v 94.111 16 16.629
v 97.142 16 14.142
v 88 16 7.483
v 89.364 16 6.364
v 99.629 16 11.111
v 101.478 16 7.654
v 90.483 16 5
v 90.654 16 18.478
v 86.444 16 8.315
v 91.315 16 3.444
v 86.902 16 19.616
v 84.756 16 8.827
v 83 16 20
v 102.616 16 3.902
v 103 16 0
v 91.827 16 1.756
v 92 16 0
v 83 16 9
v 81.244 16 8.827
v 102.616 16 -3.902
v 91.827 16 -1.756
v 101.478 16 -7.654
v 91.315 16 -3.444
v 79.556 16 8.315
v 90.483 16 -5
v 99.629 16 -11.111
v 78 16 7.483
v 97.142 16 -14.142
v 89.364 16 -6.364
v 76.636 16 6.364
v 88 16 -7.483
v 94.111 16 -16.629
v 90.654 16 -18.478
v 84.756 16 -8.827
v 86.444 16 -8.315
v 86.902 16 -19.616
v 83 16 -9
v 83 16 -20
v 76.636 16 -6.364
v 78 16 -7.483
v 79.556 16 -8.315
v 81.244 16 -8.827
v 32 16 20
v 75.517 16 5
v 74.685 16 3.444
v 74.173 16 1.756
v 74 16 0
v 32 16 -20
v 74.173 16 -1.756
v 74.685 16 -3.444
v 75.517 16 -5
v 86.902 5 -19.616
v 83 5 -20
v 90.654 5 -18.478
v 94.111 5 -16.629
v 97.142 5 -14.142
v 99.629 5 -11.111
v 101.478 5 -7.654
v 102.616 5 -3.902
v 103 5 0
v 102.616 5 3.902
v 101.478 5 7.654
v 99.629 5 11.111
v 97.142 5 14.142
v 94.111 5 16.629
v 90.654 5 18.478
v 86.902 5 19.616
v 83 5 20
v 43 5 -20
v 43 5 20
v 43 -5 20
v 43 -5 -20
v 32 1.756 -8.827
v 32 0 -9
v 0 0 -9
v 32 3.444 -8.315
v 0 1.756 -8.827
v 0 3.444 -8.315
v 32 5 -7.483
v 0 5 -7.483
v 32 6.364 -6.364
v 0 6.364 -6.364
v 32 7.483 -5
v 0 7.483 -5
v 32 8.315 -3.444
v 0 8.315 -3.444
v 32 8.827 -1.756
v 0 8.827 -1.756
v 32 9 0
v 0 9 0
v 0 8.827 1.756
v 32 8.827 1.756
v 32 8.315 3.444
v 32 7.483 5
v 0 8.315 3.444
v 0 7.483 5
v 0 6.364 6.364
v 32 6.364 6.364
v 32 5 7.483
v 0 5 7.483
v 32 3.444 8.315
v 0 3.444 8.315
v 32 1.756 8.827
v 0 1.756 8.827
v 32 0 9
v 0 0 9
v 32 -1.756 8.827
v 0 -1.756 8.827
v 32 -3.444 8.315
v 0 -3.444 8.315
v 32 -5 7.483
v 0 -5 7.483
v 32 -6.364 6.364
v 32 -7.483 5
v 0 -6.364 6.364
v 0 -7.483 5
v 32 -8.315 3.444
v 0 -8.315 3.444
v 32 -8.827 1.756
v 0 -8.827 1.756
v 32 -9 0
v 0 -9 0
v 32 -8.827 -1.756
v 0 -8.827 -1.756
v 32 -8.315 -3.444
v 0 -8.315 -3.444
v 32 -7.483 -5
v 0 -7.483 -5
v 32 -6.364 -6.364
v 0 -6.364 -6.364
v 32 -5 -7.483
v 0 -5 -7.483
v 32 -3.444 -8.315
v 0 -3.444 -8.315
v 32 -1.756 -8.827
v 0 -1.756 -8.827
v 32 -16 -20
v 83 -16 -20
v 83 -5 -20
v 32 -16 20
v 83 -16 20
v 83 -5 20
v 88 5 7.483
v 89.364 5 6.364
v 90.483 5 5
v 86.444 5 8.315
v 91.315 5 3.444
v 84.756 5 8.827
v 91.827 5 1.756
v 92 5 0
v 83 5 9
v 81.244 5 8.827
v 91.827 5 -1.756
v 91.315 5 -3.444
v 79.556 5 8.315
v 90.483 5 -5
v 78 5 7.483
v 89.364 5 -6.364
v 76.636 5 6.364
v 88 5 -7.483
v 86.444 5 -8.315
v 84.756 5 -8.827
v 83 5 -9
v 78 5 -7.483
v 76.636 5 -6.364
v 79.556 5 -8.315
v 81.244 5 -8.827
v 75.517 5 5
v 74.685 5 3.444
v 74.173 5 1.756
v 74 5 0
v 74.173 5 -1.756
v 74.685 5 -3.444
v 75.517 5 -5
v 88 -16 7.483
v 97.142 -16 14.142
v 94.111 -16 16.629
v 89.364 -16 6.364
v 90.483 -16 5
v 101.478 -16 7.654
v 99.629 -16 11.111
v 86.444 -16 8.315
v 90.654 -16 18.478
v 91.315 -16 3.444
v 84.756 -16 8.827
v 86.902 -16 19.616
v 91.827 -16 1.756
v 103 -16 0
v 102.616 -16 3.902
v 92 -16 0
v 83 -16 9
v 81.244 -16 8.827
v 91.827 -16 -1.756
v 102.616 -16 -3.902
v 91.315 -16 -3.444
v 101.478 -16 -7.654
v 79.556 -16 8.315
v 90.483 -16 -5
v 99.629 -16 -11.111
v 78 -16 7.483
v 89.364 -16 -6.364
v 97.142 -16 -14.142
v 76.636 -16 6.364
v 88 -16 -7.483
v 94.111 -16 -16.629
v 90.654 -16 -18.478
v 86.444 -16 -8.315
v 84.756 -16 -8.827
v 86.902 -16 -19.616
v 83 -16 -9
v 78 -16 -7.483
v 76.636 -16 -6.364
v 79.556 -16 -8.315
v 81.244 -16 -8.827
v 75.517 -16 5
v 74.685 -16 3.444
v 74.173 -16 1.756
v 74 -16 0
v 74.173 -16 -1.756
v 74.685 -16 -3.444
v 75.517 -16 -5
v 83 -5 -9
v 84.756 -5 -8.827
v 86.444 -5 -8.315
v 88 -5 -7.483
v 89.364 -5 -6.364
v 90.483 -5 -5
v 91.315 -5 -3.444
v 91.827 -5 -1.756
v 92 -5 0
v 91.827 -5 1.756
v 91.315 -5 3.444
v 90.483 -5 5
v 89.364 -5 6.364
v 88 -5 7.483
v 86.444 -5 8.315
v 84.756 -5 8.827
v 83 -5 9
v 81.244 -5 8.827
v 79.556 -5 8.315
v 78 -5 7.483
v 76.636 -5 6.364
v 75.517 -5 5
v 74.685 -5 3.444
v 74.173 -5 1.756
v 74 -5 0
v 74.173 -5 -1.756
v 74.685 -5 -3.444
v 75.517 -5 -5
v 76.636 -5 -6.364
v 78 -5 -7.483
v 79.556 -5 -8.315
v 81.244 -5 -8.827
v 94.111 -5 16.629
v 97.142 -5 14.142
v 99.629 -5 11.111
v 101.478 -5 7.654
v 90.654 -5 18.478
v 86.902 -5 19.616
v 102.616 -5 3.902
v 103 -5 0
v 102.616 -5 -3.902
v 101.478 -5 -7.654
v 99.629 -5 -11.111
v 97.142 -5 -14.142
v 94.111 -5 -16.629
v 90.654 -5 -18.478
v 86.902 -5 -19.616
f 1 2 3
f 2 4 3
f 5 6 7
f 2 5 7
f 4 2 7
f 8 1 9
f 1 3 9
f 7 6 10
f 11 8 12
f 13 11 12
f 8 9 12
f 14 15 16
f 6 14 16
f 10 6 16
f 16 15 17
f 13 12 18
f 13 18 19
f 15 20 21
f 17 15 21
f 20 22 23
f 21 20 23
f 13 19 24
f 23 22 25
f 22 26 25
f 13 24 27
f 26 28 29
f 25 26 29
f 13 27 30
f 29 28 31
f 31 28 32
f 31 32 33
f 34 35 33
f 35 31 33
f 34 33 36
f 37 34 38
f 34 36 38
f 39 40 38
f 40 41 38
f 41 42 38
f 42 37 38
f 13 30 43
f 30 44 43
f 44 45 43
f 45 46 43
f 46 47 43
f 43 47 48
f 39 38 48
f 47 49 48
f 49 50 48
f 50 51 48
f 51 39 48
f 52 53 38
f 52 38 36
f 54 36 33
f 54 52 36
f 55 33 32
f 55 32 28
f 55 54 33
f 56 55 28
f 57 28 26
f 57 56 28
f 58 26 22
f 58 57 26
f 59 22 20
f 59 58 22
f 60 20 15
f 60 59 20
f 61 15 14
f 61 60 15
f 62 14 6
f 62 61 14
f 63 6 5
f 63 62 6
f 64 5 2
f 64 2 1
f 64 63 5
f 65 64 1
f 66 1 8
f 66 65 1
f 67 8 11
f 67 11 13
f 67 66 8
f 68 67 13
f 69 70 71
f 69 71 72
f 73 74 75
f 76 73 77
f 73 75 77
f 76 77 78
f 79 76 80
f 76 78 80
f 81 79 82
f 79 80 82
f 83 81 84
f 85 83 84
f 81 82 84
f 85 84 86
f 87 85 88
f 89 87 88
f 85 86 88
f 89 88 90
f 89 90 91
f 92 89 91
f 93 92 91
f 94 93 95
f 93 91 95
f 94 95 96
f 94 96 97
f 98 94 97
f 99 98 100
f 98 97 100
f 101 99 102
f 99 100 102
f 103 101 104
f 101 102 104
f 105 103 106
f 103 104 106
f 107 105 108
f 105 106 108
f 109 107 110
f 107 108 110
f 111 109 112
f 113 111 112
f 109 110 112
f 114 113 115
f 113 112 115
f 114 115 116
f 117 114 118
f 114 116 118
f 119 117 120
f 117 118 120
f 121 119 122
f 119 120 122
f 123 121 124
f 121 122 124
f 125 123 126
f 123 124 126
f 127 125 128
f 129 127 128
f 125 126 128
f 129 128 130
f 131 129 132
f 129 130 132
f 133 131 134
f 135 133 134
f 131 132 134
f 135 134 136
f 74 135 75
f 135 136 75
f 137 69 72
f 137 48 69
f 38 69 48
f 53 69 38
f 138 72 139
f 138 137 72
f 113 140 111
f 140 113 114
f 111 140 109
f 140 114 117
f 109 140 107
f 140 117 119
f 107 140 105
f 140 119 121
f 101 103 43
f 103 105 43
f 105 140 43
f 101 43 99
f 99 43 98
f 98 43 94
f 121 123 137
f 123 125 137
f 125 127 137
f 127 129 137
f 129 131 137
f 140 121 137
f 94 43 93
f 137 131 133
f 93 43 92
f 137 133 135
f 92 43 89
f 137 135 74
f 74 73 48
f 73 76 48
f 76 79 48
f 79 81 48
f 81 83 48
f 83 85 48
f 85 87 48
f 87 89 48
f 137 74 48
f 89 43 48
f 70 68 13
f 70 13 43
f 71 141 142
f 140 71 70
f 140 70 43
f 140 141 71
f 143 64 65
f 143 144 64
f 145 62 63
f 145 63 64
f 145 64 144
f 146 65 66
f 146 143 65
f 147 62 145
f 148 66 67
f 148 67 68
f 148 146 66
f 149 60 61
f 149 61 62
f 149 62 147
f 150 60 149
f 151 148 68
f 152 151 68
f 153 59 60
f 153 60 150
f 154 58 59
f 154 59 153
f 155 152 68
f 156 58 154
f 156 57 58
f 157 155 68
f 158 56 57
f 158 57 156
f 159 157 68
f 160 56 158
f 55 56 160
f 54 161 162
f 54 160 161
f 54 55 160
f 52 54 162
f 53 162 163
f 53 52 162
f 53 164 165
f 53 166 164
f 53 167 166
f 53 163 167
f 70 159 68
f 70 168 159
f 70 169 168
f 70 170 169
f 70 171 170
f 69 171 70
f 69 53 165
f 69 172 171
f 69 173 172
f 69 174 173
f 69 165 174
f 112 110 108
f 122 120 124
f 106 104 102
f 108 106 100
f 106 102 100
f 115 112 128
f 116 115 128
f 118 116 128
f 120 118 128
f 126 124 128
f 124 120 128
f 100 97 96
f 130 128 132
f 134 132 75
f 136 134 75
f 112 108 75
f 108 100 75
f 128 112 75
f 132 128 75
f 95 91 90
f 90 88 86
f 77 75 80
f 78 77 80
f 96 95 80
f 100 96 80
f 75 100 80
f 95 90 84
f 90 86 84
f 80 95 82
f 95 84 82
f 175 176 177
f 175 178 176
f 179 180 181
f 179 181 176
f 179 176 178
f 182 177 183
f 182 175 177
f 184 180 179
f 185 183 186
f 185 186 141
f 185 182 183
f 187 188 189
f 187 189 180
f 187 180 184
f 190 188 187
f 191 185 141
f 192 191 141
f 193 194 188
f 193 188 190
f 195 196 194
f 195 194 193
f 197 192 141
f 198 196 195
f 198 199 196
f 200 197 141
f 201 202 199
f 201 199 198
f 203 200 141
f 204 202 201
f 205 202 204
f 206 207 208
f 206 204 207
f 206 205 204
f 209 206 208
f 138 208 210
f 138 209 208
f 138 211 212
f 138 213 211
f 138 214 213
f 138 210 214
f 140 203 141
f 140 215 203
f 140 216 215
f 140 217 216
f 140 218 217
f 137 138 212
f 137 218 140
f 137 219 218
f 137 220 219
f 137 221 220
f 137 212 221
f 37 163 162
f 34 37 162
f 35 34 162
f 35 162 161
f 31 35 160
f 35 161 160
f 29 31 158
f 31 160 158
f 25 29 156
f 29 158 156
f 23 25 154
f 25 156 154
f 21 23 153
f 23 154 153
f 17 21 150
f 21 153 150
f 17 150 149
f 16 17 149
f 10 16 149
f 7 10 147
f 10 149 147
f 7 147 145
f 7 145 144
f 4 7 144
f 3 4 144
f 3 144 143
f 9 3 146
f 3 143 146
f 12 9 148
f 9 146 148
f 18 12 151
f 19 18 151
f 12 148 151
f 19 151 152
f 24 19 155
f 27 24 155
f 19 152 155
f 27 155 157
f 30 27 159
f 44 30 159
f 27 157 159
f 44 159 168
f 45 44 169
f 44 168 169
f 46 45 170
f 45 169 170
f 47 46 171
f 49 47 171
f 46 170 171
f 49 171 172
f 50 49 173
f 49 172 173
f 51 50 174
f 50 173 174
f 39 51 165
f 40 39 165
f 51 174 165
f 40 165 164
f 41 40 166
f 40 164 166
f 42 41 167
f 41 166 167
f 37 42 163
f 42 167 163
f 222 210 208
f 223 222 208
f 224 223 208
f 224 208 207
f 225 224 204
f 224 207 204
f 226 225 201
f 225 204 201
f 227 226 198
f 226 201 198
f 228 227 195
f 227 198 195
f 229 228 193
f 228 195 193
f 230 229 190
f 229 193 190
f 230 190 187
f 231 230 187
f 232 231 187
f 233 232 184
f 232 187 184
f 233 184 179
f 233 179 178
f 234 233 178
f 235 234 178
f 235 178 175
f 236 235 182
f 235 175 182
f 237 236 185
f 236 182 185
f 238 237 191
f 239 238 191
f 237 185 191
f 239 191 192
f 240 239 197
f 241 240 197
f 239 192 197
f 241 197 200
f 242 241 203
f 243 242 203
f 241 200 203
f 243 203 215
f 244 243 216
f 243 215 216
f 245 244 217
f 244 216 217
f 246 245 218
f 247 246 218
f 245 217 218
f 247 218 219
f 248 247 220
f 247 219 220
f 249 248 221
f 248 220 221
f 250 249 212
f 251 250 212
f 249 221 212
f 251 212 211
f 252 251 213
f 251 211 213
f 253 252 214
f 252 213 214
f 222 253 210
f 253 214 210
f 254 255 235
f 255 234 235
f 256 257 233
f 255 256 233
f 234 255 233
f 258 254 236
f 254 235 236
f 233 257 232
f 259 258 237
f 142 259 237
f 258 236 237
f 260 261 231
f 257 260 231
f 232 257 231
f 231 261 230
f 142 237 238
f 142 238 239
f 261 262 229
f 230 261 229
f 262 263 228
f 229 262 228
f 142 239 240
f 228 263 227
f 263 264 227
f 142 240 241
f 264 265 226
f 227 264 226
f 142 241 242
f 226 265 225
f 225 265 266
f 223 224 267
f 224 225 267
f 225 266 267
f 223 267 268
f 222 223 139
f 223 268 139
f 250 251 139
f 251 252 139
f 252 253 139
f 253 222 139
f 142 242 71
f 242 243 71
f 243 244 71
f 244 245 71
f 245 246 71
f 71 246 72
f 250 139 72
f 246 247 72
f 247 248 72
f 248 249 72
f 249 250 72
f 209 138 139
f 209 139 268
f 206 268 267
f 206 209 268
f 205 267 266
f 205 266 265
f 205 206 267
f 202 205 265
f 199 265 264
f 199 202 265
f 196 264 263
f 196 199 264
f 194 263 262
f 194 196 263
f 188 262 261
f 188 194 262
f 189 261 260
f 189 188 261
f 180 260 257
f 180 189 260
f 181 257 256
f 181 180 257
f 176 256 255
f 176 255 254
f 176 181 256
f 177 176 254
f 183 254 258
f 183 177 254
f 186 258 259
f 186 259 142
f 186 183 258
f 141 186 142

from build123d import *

# Parameters (mm, degrees)
SKETCH1_R           = 9
BOSS_EXTRUDE1_DEPTH = 32
SKETCH2_W           = 40
SKETCH2_H           = 32
BOSS_EXTRUDE2_DEPTH = 11
SKETCH3_R           = 9
BOSS_EXTRUDE5_DEPTH = 11
LPATTERN1_COUNT     = 2
LPATTERN1_PITCH     = 21


with BuildPart() as part:
    # Sketch1 → Boss-Extrude1 (new body)
    with BuildSketch(Plane(origin=(0, 0, 0), x_dir=(0, 0, -1), z_dir=(1, 0, 0))):
        Circle(SKETCH1_R)
    extrude(amount=BOSS_EXTRUDE1_DEPTH)

    # Sketch2 → Boss-Extrude2 (add)
    with BuildSketch(Plane(origin=(32, 0, 0), x_dir=(0, 0, -1), z_dir=(1, 0, 0))):
        Rectangle(SKETCH2_W, SKETCH2_H)
    extrude(amount=BOSS_EXTRUDE2_DEPTH)

    # Sketch3 → Boss-Extrude5 (add)
    with BuildSketch(Plane(origin=(0, -16, 0), x_dir=(-1, 0, 0), z_dir=(0, -1, 0))):
        with BuildLine():
            Line((-43, 20), (-83, 20))
            ThreePointArc((-83, 20), (-103, 0), (-83, -20))
            Line((-83, -20), (-43, -20))
            Line((-43, -20), (-43, 20))
        make_face()
        with Locations(Location((-83, 0, 0), (0, 0, 90))):
            Circle(SKETCH3_R, mode=Mode.SUBTRACT)
    boss_extrude5 = extrude(amount=-BOSS_EXTRUDE5_DEPTH)

    # LPattern1: Boss-Extrude5 ×2
    with Locations(*[(0, i * LPATTERN1_PITCH, 0) for i in range(1, LPATTERN1_COUNT)]):
        add(boss_extrude5)


solid = part.part
